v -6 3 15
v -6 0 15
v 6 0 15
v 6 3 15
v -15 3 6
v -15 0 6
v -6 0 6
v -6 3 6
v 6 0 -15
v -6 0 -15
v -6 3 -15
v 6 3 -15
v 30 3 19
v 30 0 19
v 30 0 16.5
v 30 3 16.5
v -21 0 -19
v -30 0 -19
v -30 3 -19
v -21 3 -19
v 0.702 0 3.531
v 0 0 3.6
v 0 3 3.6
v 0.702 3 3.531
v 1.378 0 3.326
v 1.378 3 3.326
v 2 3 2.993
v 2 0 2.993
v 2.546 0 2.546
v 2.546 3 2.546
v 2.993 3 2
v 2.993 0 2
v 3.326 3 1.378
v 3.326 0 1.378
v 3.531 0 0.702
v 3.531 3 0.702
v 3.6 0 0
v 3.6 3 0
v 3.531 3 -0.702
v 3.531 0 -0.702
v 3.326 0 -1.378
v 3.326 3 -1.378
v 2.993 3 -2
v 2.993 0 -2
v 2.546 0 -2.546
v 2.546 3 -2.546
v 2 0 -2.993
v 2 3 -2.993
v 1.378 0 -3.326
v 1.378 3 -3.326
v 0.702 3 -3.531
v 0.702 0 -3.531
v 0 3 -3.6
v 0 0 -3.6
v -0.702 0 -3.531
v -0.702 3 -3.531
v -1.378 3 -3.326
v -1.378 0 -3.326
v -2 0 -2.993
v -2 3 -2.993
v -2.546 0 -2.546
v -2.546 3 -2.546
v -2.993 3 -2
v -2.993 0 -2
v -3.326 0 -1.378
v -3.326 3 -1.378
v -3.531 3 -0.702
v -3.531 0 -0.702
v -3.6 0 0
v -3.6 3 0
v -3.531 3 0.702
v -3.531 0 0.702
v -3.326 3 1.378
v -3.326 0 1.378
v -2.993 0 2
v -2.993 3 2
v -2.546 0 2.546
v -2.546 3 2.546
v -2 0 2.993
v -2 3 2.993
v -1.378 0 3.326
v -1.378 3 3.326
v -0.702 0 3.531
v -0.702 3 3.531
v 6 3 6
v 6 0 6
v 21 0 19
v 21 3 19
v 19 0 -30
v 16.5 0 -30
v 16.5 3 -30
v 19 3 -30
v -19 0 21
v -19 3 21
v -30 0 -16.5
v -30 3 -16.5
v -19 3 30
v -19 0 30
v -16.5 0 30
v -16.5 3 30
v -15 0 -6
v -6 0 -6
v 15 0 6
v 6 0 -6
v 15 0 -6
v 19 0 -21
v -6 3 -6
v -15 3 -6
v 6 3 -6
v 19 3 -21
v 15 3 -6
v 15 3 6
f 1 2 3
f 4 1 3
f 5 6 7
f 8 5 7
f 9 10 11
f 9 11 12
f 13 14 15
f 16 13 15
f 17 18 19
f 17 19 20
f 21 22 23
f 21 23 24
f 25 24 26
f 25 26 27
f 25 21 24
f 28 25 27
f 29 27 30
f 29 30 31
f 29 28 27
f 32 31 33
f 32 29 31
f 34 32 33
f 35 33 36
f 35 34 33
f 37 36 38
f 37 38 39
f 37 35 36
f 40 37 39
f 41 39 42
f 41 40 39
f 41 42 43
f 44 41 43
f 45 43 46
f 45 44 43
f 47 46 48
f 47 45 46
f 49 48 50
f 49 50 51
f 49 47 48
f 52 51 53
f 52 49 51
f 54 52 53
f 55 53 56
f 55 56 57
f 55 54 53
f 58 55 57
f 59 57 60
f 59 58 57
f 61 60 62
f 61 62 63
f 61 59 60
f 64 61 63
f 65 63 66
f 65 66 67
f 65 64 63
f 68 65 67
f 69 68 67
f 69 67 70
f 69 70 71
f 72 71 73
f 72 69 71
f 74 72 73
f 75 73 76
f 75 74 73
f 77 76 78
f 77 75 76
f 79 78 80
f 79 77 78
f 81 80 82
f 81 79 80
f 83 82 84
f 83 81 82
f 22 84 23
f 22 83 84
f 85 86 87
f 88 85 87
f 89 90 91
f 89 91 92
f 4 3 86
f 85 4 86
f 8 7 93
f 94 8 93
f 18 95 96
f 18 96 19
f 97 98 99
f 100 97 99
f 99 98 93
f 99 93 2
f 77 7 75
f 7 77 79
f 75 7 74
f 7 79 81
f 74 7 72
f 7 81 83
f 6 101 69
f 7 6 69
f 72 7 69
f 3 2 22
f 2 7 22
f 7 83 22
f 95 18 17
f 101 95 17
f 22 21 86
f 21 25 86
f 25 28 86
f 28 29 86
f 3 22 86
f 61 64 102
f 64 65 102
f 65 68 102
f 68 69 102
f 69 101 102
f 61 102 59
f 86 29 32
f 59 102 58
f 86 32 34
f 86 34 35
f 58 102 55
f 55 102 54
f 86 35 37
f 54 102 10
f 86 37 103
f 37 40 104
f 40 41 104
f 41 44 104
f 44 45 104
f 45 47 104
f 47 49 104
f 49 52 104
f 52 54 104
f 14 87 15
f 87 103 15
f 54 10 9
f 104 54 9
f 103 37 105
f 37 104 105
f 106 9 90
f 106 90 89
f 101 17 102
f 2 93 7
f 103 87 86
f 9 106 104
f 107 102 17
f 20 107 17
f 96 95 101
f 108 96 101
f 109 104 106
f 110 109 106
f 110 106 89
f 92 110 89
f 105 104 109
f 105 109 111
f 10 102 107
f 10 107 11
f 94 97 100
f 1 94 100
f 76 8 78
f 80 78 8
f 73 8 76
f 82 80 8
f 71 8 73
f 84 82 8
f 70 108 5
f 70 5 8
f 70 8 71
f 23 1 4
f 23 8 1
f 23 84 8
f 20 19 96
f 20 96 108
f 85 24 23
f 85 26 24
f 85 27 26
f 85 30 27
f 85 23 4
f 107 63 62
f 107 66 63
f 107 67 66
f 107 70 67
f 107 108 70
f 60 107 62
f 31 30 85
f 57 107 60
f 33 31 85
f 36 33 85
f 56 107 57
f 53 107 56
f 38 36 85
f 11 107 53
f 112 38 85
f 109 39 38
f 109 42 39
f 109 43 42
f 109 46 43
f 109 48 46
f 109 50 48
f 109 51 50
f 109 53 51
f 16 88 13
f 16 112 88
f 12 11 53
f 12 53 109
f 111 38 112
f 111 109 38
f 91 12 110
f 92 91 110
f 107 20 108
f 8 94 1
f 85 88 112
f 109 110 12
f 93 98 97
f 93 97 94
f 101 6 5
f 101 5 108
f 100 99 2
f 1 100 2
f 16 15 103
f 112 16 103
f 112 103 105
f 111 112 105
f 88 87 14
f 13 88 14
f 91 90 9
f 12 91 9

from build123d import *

# Parameters (mm, degrees)
SKETCH1_W           = 9
SKETCH1_H           = 2.5
SKETCH1_W_2         = 12
SKETCH1_H_2         = 9
SKETCH1_H_3         = 12
SKETCH1_R           = 3.6
SKETCH1_W_3         = 2.5
BOSS_EXTRUDE2_DEPTH = 3


with BuildPart() as part:
    # Sketch1 → Boss-Extrude2 (new body)
    # profile 1 of 13: a face of its own
    with BuildSketch(Plane(origin=(0, 0, 0), x_dir=(1, 0, 0), z_dir=(0, 1, 0))):
        Polygon((-6, 6), (-21, 19), (-21, 16.5), (-30, 16.5), (-15, 6), align=None)
    # profile 2 of 13: a face of its own
    with BuildSketch(Plane(origin=(0, 0, 0), x_dir=(1, 0, 0), z_dir=(0, 1, 0))):
        with Locations((-25.5, 17.75)):
            Rectangle(SKETCH1_W, SKETCH1_H)
    # profile 3 of 13: a face of its own
    with BuildSketch(Plane(origin=(0, 0, 0), x_dir=(1, 0, 0), z_dir=(0, 1, 0))):
        with Locations((0, 10.5)):
            Rectangle(SKETCH1_W_2, SKETCH1_H_2)
    # profile 4 of 13: a face of its own
    with BuildSketch(Plane(origin=(0, 0, 0), x_dir=(1, 0, 0), z_dir=(0, 1, 0))):
        with Locations((-10.5, 0)):
            Rectangle(SKETCH1_W, SKETCH1_H_3)
    # profile 5 of 13: a face of its own
    with BuildSketch(Plane(origin=(0, 0, 0), x_dir=(1, 0, 0), z_dir=(0, 1, 0))):
        Rectangle(SKETCH1_W_2, SKETCH1_H_3)
        with Locations(Location((0, 0, 0), (0, 0, 270))):
            Circle(SKETCH1_R, mode=Mode.SUBTRACT)
    # profile 6 of 13: a face of its own
    with BuildSketch(Plane(origin=(0, 0, 0), x_dir=(1, 0, 0), z_dir=(0, 1, 0))):
        with Locations((10.5, 0)):
            Rectangle(SKETCH1_W, SKETCH1_H_3)
    # profile 7 of 13: a face of its own
    with BuildSketch(Plane(origin=(0, 0, 0), x_dir=(1, 0, 0), z_dir=(0, 1, 0))):
        with Locations((0, -10.5)):
            Rectangle(SKETCH1_W_2, SKETCH1_H_2)
    # profile 8 of 13: a face of its own
    with BuildSketch(Plane(origin=(0, 0, 0), x_dir=(1, 0, 0), z_dir=(0, 1, 0))):
        Polygon((-6, -15), (-6, -6), (-19, -21), (-16.5, -21), (-16.5, -30), align=None)
    # profile 9 of 13: a face of its own
    with BuildSketch(Plane(origin=(0, 0, 0), x_dir=(1, 0, 0), z_dir=(0, 1, 0))):
        with Locations((-17.75, -25.5)):
            Rectangle(SKETCH1_W_3, SKETCH1_H_2)
    # profile 10 of 13: a face of its own
    with BuildSketch(Plane(origin=(0, 0, 0), x_dir=(1, 0, 0), z_dir=(0, 1, 0))):
        Polygon((15, -6), (6, -6), (21, -19), (21, -16.5), (30, -16.5), align=None)
    # profile 11 of 13: a face of its own
    with BuildSketch(Plane(origin=(0, 0, 0), x_dir=(1, 0, 0), z_dir=(0, 1, 0))):
        with Locations((25.5, -17.75)):
            Rectangle(SKETCH1_W, SKETCH1_H)
    # profile 12 of 13: a face of its own
    with BuildSketch(Plane(origin=(0, 0, 0), x_dir=(1, 0, 0), z_dir=(0, 1, 0))):
        Polygon((6, 15), (6, 6), (19, 21), (16.5, 21), (16.5, 30), align=None)
    # profile 13 of 13: a face of its own
    with BuildSketch(Plane(origin=(0, 0, 0), x_dir=(1, 0, 0), z_dir=(0, 1, 0))):
        with Locations((17.75, 25.5)):
            Rectangle(SKETCH1_W_3, SKETCH1_H_2)
    extrude(amount=BOSS_EXTRUDE2_DEPTH)


solid = part.part
